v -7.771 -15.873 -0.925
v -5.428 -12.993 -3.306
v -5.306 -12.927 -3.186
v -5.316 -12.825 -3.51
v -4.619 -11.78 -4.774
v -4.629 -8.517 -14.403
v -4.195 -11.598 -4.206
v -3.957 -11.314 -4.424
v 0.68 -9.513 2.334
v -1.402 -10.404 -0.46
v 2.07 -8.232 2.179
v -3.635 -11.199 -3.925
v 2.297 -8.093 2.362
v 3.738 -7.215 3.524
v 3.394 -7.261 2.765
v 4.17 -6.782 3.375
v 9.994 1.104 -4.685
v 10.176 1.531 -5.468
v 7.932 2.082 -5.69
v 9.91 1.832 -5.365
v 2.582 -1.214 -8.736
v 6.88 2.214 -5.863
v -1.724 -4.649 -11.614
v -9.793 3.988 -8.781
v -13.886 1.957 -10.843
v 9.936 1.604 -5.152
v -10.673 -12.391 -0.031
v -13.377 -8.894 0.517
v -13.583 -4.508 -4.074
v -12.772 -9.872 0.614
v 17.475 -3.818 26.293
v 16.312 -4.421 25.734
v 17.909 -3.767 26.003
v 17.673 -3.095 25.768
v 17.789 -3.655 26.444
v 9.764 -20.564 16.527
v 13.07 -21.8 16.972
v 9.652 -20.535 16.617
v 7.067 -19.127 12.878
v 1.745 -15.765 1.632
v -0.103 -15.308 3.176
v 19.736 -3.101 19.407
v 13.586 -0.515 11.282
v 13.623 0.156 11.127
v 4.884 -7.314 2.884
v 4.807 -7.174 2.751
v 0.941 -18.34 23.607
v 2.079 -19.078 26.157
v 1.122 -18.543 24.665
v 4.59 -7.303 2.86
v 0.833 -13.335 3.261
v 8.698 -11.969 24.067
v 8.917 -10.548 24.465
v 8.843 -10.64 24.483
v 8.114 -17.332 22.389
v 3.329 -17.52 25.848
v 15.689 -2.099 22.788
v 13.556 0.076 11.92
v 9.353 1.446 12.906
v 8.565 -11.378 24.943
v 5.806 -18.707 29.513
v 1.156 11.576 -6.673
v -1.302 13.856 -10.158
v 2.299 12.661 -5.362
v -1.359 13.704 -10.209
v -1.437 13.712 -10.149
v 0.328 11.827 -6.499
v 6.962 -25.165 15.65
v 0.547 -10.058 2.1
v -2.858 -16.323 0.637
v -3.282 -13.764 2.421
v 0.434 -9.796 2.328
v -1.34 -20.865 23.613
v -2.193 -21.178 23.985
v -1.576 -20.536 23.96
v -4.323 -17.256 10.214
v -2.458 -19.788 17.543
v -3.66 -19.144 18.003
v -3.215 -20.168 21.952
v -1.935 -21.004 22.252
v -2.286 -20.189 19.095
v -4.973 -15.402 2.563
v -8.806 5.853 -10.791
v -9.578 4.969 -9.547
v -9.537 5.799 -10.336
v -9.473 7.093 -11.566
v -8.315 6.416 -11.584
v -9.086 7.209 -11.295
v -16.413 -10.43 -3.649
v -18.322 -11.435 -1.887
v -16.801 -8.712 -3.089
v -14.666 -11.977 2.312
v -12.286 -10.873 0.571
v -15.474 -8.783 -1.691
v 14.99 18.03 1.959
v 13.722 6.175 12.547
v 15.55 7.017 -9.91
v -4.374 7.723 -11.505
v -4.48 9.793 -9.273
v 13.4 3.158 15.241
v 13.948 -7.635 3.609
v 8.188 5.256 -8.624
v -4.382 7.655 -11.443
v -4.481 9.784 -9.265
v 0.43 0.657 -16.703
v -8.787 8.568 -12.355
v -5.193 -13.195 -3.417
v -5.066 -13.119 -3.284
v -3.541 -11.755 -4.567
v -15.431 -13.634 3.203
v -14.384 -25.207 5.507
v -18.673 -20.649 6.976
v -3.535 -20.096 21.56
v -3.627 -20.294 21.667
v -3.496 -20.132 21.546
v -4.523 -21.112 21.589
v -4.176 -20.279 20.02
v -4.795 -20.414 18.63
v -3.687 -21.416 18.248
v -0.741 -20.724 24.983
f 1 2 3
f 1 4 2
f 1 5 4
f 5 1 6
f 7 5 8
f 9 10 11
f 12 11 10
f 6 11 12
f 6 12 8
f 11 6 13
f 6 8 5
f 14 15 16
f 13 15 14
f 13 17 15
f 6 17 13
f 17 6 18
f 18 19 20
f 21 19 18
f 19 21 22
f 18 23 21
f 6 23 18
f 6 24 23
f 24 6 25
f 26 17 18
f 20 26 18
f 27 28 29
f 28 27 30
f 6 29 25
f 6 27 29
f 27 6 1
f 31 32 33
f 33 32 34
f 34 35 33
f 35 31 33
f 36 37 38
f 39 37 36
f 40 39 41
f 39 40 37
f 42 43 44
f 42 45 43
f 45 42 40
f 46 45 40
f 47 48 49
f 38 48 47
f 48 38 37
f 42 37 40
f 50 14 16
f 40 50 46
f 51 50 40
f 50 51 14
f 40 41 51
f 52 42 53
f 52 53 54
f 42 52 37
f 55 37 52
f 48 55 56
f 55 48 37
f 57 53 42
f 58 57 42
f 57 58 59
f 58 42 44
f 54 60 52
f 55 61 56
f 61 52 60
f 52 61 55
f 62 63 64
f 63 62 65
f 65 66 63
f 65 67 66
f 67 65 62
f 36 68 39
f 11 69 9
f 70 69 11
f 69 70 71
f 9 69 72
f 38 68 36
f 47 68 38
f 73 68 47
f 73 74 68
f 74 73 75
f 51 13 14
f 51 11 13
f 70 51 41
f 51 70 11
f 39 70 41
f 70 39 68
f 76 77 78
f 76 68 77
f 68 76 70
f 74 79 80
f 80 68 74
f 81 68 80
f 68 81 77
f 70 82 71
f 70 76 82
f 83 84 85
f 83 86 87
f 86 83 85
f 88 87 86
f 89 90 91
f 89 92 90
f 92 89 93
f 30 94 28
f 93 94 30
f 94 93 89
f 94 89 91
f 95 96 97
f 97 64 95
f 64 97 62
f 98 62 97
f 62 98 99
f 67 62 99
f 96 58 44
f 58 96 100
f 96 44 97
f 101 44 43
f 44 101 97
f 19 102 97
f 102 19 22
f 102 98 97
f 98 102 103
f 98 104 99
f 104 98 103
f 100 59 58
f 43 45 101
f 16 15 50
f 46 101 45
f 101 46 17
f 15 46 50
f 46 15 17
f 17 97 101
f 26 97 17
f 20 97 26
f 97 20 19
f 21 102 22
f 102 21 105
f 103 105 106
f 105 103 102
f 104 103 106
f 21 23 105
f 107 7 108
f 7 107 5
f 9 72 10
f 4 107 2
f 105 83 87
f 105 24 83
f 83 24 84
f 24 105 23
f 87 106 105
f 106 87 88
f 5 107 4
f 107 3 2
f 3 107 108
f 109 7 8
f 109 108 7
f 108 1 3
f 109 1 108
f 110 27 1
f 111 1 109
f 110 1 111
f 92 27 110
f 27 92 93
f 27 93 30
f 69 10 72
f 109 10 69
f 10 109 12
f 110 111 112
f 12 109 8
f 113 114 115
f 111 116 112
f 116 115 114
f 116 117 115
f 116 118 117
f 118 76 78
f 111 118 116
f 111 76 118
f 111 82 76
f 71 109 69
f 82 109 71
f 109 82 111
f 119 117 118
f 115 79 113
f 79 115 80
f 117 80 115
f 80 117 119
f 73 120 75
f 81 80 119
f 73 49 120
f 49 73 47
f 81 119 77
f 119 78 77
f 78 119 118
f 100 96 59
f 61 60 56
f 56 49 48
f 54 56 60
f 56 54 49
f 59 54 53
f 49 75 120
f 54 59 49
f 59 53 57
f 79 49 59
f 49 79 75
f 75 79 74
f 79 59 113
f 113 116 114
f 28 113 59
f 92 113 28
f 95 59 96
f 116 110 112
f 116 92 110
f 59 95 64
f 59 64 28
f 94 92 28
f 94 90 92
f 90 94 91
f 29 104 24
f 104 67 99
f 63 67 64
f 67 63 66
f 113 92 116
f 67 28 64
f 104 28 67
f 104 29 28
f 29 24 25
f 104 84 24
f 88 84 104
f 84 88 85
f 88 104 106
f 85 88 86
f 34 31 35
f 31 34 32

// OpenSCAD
planeCrop(  30,[-1,1,1],[0,0,20]+[-1,1,1]*-5 ) 
union() {
    for (t = [0: 19]) {
        r = rands(0, 360, 3,t);
       c = rands(0, 1, 3);
     color(c)   rotate(r) cube(20);
    }
}


module crop(maxh = 100) {
    intersection() {
        color() {
            children();
        }
        linear_extrude(maxh)
        hull()
        projection() {
            children();
        }
    }
}
 module planeCrop(maxh = 100,normal,origin) {
  translate(origin)
     look_at( -normal )
         crop(maxh)    
             look_at(normal)
               translate(-origin)
                    color() {
                        children();
                    }
               }



module look_at(lookpoint,origin=[0,0,0],rotatefrom=[0,0,1]){
rotations=look_at(lookpoint,origin ,rotatefrom);
rotate(rotations[0],rotations[1]) children();
}
function look_at(p,o=[0,0,0],up=[0,0,1])=let(a=up,b=p-o,c=cross(a,b) ,d=angle(a,b))[d,c];

function angle (a,b)=atan2(sqrt((cross(a, b)*cross(a, b))), (a* b));
